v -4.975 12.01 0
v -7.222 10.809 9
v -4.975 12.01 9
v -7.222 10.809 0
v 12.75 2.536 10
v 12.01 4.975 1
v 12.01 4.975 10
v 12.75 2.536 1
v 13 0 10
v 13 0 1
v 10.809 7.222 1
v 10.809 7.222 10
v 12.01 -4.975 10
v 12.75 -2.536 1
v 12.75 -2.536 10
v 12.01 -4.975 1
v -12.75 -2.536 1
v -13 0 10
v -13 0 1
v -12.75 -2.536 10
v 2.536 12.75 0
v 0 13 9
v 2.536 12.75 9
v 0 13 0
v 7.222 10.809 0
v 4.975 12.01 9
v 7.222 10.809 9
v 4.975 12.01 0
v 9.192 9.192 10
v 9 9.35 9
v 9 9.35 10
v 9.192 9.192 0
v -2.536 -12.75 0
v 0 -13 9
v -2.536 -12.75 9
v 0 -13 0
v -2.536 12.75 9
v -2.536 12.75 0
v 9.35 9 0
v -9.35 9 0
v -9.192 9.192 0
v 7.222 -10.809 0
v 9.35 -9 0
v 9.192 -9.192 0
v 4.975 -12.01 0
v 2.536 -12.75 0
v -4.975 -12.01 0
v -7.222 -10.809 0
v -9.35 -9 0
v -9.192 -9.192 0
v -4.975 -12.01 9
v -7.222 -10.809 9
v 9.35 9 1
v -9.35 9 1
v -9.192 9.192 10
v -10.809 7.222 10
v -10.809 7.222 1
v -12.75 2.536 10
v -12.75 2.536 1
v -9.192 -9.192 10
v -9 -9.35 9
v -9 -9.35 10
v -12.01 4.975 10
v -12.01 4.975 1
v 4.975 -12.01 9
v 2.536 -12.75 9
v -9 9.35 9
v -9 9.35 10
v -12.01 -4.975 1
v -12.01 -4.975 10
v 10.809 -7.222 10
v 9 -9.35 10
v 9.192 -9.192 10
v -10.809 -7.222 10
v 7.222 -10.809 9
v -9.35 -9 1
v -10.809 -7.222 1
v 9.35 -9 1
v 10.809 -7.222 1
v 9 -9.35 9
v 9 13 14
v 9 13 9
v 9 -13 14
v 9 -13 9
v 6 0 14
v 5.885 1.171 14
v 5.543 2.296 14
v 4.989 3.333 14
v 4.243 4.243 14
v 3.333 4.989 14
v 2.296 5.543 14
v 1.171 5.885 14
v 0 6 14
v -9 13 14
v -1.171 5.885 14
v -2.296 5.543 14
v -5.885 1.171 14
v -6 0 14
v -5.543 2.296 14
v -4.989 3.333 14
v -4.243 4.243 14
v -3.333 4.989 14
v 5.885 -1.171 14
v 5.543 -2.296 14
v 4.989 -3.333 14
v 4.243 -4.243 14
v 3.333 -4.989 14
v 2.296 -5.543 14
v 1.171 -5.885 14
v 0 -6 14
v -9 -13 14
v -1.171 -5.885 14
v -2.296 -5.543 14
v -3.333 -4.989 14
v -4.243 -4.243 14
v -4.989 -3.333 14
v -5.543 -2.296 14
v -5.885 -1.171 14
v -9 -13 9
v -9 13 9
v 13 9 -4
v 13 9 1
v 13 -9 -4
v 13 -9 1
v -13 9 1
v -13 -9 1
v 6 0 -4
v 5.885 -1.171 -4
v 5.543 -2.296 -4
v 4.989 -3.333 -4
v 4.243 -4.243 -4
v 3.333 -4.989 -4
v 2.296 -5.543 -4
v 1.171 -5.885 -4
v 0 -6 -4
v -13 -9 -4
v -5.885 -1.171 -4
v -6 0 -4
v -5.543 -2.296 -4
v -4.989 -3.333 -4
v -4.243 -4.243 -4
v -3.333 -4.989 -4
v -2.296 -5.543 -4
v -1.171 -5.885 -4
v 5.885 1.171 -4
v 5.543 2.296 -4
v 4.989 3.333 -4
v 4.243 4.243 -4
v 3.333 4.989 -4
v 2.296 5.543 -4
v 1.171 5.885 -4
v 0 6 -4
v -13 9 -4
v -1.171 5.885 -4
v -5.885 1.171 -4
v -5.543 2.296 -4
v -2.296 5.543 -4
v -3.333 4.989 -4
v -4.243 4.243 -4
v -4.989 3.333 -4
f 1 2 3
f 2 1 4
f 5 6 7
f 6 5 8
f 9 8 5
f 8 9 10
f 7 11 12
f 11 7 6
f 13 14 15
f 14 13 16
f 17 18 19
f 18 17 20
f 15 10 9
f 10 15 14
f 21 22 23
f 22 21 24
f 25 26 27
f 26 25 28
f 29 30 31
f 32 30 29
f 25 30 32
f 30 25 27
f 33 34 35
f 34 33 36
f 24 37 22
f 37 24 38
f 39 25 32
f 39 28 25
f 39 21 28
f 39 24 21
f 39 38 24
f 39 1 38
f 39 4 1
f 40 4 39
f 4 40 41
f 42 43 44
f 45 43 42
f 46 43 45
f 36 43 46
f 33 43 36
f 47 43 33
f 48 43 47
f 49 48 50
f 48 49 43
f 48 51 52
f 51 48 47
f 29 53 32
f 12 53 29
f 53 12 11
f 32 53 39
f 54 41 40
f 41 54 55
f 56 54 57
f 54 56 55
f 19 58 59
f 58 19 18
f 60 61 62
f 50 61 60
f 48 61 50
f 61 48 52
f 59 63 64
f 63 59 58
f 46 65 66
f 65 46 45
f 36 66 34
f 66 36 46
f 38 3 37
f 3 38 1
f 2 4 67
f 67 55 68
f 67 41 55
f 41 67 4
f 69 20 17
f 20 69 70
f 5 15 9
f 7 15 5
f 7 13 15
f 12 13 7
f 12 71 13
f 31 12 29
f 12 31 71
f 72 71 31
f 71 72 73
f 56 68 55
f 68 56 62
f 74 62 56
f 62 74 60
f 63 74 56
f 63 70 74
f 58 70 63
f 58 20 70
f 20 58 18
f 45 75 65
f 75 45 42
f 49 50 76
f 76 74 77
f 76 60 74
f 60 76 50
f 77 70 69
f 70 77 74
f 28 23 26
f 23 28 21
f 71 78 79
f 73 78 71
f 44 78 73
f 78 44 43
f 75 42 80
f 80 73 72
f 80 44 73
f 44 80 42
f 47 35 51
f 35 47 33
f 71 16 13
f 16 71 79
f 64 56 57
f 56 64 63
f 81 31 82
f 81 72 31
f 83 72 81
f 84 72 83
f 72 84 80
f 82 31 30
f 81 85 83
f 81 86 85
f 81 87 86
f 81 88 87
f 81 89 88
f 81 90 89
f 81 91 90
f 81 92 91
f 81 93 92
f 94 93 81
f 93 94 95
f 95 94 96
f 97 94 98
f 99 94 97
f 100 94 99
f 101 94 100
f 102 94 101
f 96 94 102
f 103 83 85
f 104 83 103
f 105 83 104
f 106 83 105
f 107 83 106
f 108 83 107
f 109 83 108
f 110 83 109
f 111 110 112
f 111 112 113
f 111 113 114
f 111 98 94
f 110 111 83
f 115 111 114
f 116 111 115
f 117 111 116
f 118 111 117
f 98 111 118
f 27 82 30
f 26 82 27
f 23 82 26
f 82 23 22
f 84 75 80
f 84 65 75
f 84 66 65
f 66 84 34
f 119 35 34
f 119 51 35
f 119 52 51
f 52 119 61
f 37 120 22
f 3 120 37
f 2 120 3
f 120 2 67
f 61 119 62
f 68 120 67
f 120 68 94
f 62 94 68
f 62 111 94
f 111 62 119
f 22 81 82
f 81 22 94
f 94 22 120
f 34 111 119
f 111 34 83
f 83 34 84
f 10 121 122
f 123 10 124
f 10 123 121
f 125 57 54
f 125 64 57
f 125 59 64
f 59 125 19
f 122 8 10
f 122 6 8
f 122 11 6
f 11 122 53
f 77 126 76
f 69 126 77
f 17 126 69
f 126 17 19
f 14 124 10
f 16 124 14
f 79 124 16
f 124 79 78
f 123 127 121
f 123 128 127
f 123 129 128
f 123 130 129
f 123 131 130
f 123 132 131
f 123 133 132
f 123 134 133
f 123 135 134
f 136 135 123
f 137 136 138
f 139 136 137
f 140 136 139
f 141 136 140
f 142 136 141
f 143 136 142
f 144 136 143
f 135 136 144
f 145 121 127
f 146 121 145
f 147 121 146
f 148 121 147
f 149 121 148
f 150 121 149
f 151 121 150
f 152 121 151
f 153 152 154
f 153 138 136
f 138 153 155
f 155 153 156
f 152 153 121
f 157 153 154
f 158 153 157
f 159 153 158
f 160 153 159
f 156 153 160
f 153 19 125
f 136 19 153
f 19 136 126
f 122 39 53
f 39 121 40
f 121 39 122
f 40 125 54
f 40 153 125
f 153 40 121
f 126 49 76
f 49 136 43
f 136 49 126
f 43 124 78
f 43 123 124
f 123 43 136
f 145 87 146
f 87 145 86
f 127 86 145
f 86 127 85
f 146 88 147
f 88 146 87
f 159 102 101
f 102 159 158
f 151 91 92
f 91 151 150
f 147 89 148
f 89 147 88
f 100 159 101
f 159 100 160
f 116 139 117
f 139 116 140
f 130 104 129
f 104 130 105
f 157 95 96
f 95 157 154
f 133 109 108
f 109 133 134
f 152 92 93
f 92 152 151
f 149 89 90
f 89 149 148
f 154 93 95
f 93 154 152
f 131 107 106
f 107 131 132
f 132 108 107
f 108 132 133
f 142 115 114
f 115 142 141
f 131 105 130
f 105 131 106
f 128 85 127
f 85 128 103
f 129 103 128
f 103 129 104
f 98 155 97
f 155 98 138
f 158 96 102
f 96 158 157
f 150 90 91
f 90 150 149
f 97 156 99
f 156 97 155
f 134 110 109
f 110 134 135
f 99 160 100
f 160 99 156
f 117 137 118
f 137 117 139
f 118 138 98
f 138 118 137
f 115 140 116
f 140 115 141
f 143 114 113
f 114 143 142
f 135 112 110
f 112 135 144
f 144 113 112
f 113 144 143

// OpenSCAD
$fn = 32;

// ----------------------------------------------------------------------
// Oldham coupling disc: 26 x 18 mm
// ----------------------------------------------------------------------

// --- parameters (mm) ---
disc_d = 26;              // disc diameter
disc_t = 10;              // disc thickness
tongue_w = 18;            // tongue width
tongue_h = 4;             // tongue height
bore_d = 12;              // centre lightening bore

module disc() {
  cylinder(h = disc_t, d = disc_d);
  /* tongue on the top face, sunk 1 mm into the disc */
  translate([-tongue_w / 2, -disc_d / 2, disc_t - 1]) cube([tongue_w, disc_d, tongue_h + 1]);
  /* slot wall on the bottom face, 90 degrees turned */
  translate([-disc_d / 2, -tongue_w / 2, -tongue_h]) cube([disc_d, tongue_w, tongue_h + 1]);
}

difference() {
  disc();
  translate([0, 0, -tongue_h - 1]) cylinder(h = disc_t + 2 * tongue_h + 2, d = bore_d);
}
